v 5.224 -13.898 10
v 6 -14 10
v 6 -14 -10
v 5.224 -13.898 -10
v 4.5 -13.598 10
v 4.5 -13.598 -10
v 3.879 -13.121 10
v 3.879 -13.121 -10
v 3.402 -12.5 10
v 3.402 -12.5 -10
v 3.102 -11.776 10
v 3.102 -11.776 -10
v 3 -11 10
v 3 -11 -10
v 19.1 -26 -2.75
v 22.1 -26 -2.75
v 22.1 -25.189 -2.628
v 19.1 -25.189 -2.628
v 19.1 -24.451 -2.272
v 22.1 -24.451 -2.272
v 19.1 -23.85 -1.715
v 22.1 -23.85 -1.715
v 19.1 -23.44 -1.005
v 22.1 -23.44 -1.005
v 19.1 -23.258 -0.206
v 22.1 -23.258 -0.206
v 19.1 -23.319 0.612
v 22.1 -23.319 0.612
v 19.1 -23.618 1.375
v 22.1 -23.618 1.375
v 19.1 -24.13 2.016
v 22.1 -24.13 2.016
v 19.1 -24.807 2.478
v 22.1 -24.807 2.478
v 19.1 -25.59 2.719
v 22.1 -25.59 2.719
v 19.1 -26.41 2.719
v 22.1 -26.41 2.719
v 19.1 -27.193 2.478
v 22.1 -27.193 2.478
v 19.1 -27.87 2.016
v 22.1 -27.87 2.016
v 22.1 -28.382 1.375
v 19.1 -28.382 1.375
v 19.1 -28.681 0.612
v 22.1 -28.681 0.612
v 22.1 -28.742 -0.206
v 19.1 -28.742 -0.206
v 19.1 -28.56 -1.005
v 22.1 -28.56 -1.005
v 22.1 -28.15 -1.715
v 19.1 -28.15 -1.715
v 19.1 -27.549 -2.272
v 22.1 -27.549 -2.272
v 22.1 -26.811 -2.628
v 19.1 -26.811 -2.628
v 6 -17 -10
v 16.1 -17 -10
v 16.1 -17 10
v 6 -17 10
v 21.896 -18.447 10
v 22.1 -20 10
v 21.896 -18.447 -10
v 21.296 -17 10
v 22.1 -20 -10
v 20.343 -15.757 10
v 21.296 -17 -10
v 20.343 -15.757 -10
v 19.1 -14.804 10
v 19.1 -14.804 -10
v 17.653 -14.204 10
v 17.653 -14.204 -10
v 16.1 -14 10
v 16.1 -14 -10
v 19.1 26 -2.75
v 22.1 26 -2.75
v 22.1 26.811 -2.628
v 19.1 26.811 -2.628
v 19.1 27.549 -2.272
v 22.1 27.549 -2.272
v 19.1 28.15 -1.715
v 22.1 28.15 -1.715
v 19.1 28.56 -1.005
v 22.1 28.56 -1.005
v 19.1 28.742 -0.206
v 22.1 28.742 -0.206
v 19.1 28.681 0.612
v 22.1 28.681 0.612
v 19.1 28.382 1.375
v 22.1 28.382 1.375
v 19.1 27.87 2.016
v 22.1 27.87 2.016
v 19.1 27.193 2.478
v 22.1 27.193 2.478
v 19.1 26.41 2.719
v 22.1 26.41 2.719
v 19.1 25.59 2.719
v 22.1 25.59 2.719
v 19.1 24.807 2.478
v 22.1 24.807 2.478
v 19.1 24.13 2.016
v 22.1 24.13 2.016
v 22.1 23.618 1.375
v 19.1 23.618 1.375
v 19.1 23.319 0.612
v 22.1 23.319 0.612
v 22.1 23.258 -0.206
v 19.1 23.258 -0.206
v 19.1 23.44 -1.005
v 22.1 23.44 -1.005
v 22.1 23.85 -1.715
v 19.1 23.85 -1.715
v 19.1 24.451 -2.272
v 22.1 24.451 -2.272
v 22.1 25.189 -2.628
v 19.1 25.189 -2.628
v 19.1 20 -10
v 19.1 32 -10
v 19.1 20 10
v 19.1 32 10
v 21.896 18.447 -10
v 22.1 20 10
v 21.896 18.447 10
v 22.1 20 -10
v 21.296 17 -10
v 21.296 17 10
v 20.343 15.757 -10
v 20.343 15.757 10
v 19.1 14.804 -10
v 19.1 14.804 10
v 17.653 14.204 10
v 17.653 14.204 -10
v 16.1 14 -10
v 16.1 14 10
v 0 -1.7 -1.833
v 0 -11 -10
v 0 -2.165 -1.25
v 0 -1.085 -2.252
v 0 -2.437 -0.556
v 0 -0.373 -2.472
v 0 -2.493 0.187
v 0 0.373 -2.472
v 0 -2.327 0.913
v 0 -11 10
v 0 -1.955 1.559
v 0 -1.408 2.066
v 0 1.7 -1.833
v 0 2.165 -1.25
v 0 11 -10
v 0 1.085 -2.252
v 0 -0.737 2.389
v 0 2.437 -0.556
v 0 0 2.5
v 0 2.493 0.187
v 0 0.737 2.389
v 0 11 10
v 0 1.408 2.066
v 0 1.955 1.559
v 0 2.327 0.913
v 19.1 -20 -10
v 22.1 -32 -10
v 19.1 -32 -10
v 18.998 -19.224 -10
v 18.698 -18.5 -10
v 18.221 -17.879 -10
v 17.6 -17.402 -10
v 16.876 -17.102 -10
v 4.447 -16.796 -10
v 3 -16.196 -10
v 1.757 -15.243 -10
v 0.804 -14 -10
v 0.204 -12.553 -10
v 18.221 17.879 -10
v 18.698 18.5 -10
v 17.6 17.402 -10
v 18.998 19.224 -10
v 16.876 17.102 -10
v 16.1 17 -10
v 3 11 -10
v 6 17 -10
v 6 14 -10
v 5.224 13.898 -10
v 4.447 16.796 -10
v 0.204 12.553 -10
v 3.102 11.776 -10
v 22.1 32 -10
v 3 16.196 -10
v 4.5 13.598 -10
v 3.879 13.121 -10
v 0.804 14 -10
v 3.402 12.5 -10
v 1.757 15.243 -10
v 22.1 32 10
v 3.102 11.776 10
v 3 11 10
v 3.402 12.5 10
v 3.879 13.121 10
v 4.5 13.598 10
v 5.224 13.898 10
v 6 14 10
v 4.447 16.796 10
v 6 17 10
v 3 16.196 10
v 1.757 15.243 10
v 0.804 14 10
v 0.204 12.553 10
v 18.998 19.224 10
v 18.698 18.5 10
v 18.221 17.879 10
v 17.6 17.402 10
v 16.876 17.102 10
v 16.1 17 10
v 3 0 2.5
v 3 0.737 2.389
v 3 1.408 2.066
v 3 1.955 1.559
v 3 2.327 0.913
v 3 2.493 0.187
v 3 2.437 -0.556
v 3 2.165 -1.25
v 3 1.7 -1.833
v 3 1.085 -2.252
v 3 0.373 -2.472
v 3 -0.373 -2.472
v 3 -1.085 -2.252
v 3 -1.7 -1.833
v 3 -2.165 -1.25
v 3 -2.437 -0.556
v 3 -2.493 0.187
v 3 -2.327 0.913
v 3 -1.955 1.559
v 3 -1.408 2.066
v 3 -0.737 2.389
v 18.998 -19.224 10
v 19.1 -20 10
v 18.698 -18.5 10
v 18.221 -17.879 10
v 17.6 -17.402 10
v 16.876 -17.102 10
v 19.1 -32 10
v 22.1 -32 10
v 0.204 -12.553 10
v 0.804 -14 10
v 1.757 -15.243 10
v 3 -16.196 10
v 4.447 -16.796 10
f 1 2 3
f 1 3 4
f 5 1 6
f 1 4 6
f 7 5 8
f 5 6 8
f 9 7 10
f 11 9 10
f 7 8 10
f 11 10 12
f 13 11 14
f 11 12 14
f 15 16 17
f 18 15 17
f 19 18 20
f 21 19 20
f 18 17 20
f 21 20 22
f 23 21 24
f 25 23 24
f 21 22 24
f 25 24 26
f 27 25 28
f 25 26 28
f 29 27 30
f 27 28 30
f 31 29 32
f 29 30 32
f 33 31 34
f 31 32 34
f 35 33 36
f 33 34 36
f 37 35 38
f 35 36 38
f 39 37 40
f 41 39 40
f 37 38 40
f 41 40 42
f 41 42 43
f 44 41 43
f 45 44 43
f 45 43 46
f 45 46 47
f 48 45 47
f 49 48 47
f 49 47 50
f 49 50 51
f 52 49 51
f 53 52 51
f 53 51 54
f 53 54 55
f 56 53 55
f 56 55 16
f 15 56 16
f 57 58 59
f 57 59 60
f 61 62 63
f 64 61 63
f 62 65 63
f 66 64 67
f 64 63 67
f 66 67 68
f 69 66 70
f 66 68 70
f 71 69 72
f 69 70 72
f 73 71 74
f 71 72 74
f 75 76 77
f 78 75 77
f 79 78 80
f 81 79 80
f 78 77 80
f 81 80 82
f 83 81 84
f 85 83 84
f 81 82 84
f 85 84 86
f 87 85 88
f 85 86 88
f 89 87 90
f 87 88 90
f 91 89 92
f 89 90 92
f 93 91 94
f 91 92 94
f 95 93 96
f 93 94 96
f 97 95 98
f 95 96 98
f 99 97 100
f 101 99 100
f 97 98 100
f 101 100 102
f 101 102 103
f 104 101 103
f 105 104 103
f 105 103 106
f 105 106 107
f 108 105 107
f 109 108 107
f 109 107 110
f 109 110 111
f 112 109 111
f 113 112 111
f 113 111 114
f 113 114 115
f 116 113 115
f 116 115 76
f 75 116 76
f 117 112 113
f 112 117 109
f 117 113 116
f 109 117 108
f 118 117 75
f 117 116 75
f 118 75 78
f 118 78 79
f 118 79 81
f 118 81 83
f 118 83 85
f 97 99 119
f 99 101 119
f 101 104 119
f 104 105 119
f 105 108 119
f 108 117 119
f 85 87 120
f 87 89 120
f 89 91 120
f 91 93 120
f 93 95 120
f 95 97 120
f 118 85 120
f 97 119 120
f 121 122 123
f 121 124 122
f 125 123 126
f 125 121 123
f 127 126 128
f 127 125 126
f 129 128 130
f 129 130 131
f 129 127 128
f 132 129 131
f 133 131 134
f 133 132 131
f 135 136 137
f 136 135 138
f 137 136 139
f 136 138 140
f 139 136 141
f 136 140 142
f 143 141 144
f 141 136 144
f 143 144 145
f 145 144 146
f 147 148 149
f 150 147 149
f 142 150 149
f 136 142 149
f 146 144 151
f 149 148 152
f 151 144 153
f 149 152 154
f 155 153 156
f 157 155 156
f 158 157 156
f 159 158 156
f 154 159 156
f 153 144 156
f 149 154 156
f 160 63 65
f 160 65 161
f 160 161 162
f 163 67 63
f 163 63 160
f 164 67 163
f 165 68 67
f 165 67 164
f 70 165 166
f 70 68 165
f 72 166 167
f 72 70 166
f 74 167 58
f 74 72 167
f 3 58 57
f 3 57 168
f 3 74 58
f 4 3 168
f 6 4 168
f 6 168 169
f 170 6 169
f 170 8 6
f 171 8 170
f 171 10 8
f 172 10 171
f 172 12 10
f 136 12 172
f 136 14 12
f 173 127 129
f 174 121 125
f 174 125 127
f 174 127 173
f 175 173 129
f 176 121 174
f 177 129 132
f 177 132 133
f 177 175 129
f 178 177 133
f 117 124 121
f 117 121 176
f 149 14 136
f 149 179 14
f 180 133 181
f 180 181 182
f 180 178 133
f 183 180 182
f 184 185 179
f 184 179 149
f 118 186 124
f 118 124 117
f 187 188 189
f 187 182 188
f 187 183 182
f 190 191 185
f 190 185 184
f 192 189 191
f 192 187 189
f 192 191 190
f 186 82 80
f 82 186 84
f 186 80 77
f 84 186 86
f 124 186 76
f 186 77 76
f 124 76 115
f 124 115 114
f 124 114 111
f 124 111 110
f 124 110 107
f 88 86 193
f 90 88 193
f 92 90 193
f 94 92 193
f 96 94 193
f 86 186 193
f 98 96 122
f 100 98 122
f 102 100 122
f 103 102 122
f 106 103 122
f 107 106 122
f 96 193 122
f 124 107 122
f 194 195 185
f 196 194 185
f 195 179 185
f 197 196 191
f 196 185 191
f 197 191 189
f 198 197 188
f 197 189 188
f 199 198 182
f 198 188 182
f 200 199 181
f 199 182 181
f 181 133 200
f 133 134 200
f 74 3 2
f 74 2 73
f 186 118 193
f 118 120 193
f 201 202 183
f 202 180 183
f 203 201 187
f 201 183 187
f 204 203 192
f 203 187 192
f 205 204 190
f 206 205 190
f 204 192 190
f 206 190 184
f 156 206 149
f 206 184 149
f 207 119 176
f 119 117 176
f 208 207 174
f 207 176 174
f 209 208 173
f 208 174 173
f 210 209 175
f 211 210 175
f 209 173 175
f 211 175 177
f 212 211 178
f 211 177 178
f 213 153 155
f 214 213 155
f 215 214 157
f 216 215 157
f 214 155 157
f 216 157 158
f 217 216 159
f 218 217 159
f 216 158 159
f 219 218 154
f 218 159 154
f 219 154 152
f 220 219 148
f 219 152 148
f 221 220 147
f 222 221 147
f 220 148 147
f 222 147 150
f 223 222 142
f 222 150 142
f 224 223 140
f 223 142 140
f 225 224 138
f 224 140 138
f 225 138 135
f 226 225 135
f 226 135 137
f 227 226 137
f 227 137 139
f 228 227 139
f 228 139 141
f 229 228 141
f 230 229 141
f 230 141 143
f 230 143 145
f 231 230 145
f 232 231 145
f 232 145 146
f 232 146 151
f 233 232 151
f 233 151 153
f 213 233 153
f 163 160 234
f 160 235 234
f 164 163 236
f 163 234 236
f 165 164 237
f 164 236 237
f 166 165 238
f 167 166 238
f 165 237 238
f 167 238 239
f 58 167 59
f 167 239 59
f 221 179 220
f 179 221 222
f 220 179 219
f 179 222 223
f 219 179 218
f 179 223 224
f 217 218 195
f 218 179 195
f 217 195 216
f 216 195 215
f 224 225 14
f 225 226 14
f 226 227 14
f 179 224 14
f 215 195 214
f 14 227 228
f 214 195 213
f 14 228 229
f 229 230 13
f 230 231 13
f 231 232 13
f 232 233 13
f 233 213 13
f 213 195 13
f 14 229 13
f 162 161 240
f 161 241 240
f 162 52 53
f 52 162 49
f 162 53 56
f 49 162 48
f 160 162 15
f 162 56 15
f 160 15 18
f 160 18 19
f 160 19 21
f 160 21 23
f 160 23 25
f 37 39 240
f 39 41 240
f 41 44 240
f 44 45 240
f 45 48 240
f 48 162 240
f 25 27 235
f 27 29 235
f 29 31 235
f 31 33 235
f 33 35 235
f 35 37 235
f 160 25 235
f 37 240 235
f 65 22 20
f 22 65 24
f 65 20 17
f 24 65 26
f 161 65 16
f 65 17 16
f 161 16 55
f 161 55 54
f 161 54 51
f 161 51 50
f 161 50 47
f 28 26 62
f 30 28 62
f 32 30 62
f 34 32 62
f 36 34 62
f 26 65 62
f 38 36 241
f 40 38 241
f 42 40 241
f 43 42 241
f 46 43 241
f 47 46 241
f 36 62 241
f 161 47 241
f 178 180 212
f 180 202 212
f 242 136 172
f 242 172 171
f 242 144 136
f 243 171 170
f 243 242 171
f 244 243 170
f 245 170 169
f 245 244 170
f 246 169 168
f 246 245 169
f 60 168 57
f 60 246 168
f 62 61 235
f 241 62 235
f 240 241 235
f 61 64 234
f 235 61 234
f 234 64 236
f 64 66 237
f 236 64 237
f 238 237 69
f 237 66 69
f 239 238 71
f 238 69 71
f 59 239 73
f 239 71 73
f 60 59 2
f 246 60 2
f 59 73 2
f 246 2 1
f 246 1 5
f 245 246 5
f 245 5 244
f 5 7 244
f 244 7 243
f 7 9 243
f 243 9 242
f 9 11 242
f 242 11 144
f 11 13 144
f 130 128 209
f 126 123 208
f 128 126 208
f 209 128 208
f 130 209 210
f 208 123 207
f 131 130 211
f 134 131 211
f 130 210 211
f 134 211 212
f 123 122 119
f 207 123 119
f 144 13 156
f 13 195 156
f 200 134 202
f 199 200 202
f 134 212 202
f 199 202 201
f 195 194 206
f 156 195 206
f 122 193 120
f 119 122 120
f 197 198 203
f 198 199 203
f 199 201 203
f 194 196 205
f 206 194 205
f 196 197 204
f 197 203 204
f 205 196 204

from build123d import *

# Parameters (mm, degrees)
BOSS_EXTRUDE1_DEPTH        = 10
FILLET1_R                  = 3
FILLET2_R                  = 6
SKETCH3_R                  = 2.5
CUT_EXTRUDE1_DEPTH         = 41.154825364
F_5_5_5_5_DIAMETER_HOLE1_D = 5.5


with BuildPart() as part:
    # Sketch1 → Boss-Extrude1 (new, symmetric)
    with BuildSketch(Plane.XY):
        Polygon((0, -17), (0, 17), (19.1, 17), (19.1, 32), (22.1, 32), (22.1, 14), (3, 14), (3, -14), (22.1, -14), (22.1, -32), (19.1, -32), (19.1, -17), align=None)
    extrude(amount=BOSS_EXTRUDE1_DEPTH, both=True)

    # Fillet1
    fillet1_edges = [part.edges().sort_by_distance(p)[0] for p in [
        (3, -14, 0),
        (19.1, -17, 0),
        (19.1, 17, 0),
        (3, 14, 0),
    ]]
    fillet(fillet1_edges, radius=FILLET1_R)

    # Fillet2
    fillet2_edges = [part.edges().sort_by_distance(p)[0] for p in [
        (22.1, -14, 0),
        (0, -17, 0),
        (0, 17, 0),
        (22.1, 14, 0),
    ]]
    fillet(fillet2_edges, radius=FILLET2_R)

    # Sketch3 → Cut-Extrude1 (cut, through all)
    with BuildSketch(Plane.ZY):
        Circle(SKETCH3_R)
    extrude(amount=-CUT_EXTRUDE1_DEPTH, mode=Mode.SUBTRACT)

    # Ø5.5 (5.5) Diameter Hole1 (through all)
    with Locations(Plane.ZY):
        with Locations((0, 26), (0, -26)):
            Hole(F_5_5_5_5_DIAMETER_HOLE1_D / 2)


solid = part.part
